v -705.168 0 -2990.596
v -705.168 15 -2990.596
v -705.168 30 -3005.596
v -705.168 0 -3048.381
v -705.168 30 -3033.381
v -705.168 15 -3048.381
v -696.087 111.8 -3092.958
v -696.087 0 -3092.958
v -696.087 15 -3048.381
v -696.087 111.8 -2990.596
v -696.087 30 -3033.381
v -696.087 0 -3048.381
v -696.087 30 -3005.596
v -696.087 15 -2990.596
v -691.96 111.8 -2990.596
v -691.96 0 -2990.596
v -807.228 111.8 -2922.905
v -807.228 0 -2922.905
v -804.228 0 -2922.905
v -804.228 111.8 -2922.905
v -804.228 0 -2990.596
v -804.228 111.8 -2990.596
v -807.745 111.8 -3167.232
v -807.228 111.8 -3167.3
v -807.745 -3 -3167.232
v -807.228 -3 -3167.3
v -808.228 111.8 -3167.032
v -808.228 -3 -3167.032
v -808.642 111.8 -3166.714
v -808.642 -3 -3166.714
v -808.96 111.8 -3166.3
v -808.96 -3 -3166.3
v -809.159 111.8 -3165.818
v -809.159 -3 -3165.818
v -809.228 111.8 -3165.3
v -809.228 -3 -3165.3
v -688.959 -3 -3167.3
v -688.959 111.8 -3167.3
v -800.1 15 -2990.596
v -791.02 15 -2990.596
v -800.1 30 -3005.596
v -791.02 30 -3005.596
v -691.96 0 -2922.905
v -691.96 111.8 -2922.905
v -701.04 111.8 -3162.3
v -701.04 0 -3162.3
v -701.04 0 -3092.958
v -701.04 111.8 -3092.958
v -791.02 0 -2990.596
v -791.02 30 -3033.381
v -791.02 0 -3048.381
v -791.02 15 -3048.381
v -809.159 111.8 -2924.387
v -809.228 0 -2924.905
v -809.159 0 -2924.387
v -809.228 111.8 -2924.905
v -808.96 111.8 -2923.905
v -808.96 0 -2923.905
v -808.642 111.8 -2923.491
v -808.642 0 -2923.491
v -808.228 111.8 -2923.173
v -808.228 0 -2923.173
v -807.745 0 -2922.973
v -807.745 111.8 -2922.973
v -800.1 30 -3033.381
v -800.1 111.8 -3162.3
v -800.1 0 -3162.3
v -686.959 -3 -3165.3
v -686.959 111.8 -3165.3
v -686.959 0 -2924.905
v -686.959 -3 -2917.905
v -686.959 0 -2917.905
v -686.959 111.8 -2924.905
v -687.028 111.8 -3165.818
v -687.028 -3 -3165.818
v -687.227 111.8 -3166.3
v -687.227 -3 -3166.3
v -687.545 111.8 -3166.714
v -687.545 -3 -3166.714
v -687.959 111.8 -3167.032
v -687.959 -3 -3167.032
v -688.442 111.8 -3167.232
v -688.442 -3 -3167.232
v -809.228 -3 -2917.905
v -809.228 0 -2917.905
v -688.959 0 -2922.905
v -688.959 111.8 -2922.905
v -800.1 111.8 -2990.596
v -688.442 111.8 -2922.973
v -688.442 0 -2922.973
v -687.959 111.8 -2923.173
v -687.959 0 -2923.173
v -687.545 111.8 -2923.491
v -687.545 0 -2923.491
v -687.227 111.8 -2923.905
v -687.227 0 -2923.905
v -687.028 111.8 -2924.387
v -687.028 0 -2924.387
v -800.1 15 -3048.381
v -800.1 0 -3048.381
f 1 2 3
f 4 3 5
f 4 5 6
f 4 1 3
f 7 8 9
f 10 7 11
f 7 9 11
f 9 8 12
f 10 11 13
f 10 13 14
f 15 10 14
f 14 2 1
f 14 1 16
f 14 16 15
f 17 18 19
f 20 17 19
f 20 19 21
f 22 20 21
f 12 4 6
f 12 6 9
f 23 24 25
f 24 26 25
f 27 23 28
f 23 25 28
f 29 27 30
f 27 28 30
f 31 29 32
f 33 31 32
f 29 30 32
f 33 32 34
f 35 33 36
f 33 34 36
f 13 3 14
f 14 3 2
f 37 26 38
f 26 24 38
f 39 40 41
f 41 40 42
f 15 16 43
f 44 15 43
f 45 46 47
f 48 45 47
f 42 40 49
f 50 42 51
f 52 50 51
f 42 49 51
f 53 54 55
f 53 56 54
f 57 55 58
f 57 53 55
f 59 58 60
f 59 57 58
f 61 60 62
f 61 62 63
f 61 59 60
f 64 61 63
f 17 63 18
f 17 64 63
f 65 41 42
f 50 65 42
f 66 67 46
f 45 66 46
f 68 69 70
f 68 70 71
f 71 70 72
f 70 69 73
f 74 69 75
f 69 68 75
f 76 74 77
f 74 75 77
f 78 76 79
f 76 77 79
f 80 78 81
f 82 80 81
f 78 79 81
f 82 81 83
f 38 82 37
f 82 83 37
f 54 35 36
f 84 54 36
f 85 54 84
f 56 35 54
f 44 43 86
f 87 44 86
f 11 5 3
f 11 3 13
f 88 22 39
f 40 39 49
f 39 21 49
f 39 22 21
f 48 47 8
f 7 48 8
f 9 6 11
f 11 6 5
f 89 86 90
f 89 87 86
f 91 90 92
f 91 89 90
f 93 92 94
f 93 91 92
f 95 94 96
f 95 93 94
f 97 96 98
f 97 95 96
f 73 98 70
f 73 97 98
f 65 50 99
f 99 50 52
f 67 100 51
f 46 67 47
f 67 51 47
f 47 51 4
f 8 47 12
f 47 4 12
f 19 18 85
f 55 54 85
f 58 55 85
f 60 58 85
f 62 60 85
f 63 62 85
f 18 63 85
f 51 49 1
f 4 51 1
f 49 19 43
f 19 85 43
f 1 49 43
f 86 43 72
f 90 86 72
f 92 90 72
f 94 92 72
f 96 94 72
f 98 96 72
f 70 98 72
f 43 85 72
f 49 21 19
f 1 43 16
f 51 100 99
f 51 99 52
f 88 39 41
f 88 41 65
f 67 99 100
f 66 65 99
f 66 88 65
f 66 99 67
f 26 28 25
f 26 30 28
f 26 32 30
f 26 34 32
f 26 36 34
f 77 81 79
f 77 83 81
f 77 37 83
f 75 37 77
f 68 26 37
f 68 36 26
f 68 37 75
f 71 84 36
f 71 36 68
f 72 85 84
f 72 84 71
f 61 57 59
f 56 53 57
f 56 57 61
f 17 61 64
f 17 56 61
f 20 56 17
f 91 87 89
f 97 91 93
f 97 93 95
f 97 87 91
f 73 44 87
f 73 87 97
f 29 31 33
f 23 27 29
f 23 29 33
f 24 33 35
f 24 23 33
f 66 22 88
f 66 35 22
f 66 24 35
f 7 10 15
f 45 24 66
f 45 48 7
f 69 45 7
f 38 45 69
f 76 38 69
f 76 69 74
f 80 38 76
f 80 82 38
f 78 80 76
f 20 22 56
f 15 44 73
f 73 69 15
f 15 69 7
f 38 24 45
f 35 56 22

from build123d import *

# Parameters (mm, degrees)
BOSS_EXTRUDE1_DEPTH = 111.8
SKETCH7_W           = 122.268
SKETCH7_H           = 249.395
BOSS_EXTRUDE2_DEPTH = 3
SKETCH8_W           = 9.0805
SKETCH8_H           = 57.785
BOSS_EXTRUDE3_DEPTH = 30
CUT_EXTRUDE1_DEPTH  = 9.0805
CUT_EXTRUDE2_DEPTH  = 9.0805
FILLET1_R           = 2


with BuildPart() as part:
    # Sketch6 → Boss-Extrude1 (new body)
    with BuildSketch(Plane(origin=(0, 0, 0), x_dir=(1, 0, 0), z_dir=(0, 1, 0))):
        Polygon((-809.2275, 2922.905), (-804.2275, 2922.905), (-804.2275, 2990.596), (-800.1, 2990.596), (-800.1, 3162.3), (-701.04, 3162.3), (-701.04, 3092.958), (-696.087, 3092.958), (-696.087, 2990.596), (-691.9595, 2990.596), (-691.9595, 2922.905), (-686.9595, 2922.905), (-686.9595, 3167.3), (-809.2275, 3167.3), align=None)
    extrude(amount=BOSS_EXTRUDE1_DEPTH)

    # Sketch7 → Boss-Extrude2 (add)
    with BuildSketch(Plane.XZ):
        with Locations((-748.0935, -3042.6025)):
            Rectangle(SKETCH7_W, SKETCH7_H)
    extrude(amount=BOSS_EXTRUDE2_DEPTH)

    # Sketch8 → Boss-Extrude3 (add)
    with BuildSketch(Plane(origin=(0, 0, 0), x_dir=(1, 0, 0), z_dir=(0, 1, 0))):
        with Locations((-795.55975, 3019.4885)):
            Rectangle(SKETCH8_W, SKETCH8_H)
        with Locations((-700.62725, 3019.4885)):
            Rectangle(SKETCH8_W, SKETCH8_H)
    extrude(amount=BOSS_EXTRUDE3_DEPTH)

    # Sketch9 → Cut-Extrude1 (cut)
    with BuildSketch(Plane(origin=(-791.0195, 0, 0), x_dir=(0, 0, -1), z_dir=(1, 0, 0))):
        Polygon((2990.596, 30), (2990.596, 15), (3005.596, 30), align=None)
        Polygon((3048.381, 30), (3033.381, 30), (3048.381, 15), align=None)
    extrude(amount=-CUT_EXTRUDE1_DEPTH, mode=Mode.SUBTRACT)

    # Sketch10 → Cut-Extrude2 (cut)
    with BuildSketch(Plane.ZY.offset(705.1675)):
        Polygon((-3048.381, 30), (-3048.381, 15), (-3033.381, 30), align=None)
        Polygon((-2990.596, 30), (-3005.596, 30), (-2990.596, 15), align=None)
    extrude(amount=-CUT_EXTRUDE2_DEPTH, mode=Mode.SUBTRACT)

    # Fillet1
    fillet1_edges = [part.edges().sort_by_distance(p)[0] for p in [
        (-809.2275, 55.9, -2922.905),
        (-809.2275, 54.4, -3167.3),
        (-686.9595, 54.4, -3167.3),
        (-686.9595, 55.9, -2922.905),
    ]]
    fillet(fillet1_edges, radius=FILLET1_R)


solid = part.part
